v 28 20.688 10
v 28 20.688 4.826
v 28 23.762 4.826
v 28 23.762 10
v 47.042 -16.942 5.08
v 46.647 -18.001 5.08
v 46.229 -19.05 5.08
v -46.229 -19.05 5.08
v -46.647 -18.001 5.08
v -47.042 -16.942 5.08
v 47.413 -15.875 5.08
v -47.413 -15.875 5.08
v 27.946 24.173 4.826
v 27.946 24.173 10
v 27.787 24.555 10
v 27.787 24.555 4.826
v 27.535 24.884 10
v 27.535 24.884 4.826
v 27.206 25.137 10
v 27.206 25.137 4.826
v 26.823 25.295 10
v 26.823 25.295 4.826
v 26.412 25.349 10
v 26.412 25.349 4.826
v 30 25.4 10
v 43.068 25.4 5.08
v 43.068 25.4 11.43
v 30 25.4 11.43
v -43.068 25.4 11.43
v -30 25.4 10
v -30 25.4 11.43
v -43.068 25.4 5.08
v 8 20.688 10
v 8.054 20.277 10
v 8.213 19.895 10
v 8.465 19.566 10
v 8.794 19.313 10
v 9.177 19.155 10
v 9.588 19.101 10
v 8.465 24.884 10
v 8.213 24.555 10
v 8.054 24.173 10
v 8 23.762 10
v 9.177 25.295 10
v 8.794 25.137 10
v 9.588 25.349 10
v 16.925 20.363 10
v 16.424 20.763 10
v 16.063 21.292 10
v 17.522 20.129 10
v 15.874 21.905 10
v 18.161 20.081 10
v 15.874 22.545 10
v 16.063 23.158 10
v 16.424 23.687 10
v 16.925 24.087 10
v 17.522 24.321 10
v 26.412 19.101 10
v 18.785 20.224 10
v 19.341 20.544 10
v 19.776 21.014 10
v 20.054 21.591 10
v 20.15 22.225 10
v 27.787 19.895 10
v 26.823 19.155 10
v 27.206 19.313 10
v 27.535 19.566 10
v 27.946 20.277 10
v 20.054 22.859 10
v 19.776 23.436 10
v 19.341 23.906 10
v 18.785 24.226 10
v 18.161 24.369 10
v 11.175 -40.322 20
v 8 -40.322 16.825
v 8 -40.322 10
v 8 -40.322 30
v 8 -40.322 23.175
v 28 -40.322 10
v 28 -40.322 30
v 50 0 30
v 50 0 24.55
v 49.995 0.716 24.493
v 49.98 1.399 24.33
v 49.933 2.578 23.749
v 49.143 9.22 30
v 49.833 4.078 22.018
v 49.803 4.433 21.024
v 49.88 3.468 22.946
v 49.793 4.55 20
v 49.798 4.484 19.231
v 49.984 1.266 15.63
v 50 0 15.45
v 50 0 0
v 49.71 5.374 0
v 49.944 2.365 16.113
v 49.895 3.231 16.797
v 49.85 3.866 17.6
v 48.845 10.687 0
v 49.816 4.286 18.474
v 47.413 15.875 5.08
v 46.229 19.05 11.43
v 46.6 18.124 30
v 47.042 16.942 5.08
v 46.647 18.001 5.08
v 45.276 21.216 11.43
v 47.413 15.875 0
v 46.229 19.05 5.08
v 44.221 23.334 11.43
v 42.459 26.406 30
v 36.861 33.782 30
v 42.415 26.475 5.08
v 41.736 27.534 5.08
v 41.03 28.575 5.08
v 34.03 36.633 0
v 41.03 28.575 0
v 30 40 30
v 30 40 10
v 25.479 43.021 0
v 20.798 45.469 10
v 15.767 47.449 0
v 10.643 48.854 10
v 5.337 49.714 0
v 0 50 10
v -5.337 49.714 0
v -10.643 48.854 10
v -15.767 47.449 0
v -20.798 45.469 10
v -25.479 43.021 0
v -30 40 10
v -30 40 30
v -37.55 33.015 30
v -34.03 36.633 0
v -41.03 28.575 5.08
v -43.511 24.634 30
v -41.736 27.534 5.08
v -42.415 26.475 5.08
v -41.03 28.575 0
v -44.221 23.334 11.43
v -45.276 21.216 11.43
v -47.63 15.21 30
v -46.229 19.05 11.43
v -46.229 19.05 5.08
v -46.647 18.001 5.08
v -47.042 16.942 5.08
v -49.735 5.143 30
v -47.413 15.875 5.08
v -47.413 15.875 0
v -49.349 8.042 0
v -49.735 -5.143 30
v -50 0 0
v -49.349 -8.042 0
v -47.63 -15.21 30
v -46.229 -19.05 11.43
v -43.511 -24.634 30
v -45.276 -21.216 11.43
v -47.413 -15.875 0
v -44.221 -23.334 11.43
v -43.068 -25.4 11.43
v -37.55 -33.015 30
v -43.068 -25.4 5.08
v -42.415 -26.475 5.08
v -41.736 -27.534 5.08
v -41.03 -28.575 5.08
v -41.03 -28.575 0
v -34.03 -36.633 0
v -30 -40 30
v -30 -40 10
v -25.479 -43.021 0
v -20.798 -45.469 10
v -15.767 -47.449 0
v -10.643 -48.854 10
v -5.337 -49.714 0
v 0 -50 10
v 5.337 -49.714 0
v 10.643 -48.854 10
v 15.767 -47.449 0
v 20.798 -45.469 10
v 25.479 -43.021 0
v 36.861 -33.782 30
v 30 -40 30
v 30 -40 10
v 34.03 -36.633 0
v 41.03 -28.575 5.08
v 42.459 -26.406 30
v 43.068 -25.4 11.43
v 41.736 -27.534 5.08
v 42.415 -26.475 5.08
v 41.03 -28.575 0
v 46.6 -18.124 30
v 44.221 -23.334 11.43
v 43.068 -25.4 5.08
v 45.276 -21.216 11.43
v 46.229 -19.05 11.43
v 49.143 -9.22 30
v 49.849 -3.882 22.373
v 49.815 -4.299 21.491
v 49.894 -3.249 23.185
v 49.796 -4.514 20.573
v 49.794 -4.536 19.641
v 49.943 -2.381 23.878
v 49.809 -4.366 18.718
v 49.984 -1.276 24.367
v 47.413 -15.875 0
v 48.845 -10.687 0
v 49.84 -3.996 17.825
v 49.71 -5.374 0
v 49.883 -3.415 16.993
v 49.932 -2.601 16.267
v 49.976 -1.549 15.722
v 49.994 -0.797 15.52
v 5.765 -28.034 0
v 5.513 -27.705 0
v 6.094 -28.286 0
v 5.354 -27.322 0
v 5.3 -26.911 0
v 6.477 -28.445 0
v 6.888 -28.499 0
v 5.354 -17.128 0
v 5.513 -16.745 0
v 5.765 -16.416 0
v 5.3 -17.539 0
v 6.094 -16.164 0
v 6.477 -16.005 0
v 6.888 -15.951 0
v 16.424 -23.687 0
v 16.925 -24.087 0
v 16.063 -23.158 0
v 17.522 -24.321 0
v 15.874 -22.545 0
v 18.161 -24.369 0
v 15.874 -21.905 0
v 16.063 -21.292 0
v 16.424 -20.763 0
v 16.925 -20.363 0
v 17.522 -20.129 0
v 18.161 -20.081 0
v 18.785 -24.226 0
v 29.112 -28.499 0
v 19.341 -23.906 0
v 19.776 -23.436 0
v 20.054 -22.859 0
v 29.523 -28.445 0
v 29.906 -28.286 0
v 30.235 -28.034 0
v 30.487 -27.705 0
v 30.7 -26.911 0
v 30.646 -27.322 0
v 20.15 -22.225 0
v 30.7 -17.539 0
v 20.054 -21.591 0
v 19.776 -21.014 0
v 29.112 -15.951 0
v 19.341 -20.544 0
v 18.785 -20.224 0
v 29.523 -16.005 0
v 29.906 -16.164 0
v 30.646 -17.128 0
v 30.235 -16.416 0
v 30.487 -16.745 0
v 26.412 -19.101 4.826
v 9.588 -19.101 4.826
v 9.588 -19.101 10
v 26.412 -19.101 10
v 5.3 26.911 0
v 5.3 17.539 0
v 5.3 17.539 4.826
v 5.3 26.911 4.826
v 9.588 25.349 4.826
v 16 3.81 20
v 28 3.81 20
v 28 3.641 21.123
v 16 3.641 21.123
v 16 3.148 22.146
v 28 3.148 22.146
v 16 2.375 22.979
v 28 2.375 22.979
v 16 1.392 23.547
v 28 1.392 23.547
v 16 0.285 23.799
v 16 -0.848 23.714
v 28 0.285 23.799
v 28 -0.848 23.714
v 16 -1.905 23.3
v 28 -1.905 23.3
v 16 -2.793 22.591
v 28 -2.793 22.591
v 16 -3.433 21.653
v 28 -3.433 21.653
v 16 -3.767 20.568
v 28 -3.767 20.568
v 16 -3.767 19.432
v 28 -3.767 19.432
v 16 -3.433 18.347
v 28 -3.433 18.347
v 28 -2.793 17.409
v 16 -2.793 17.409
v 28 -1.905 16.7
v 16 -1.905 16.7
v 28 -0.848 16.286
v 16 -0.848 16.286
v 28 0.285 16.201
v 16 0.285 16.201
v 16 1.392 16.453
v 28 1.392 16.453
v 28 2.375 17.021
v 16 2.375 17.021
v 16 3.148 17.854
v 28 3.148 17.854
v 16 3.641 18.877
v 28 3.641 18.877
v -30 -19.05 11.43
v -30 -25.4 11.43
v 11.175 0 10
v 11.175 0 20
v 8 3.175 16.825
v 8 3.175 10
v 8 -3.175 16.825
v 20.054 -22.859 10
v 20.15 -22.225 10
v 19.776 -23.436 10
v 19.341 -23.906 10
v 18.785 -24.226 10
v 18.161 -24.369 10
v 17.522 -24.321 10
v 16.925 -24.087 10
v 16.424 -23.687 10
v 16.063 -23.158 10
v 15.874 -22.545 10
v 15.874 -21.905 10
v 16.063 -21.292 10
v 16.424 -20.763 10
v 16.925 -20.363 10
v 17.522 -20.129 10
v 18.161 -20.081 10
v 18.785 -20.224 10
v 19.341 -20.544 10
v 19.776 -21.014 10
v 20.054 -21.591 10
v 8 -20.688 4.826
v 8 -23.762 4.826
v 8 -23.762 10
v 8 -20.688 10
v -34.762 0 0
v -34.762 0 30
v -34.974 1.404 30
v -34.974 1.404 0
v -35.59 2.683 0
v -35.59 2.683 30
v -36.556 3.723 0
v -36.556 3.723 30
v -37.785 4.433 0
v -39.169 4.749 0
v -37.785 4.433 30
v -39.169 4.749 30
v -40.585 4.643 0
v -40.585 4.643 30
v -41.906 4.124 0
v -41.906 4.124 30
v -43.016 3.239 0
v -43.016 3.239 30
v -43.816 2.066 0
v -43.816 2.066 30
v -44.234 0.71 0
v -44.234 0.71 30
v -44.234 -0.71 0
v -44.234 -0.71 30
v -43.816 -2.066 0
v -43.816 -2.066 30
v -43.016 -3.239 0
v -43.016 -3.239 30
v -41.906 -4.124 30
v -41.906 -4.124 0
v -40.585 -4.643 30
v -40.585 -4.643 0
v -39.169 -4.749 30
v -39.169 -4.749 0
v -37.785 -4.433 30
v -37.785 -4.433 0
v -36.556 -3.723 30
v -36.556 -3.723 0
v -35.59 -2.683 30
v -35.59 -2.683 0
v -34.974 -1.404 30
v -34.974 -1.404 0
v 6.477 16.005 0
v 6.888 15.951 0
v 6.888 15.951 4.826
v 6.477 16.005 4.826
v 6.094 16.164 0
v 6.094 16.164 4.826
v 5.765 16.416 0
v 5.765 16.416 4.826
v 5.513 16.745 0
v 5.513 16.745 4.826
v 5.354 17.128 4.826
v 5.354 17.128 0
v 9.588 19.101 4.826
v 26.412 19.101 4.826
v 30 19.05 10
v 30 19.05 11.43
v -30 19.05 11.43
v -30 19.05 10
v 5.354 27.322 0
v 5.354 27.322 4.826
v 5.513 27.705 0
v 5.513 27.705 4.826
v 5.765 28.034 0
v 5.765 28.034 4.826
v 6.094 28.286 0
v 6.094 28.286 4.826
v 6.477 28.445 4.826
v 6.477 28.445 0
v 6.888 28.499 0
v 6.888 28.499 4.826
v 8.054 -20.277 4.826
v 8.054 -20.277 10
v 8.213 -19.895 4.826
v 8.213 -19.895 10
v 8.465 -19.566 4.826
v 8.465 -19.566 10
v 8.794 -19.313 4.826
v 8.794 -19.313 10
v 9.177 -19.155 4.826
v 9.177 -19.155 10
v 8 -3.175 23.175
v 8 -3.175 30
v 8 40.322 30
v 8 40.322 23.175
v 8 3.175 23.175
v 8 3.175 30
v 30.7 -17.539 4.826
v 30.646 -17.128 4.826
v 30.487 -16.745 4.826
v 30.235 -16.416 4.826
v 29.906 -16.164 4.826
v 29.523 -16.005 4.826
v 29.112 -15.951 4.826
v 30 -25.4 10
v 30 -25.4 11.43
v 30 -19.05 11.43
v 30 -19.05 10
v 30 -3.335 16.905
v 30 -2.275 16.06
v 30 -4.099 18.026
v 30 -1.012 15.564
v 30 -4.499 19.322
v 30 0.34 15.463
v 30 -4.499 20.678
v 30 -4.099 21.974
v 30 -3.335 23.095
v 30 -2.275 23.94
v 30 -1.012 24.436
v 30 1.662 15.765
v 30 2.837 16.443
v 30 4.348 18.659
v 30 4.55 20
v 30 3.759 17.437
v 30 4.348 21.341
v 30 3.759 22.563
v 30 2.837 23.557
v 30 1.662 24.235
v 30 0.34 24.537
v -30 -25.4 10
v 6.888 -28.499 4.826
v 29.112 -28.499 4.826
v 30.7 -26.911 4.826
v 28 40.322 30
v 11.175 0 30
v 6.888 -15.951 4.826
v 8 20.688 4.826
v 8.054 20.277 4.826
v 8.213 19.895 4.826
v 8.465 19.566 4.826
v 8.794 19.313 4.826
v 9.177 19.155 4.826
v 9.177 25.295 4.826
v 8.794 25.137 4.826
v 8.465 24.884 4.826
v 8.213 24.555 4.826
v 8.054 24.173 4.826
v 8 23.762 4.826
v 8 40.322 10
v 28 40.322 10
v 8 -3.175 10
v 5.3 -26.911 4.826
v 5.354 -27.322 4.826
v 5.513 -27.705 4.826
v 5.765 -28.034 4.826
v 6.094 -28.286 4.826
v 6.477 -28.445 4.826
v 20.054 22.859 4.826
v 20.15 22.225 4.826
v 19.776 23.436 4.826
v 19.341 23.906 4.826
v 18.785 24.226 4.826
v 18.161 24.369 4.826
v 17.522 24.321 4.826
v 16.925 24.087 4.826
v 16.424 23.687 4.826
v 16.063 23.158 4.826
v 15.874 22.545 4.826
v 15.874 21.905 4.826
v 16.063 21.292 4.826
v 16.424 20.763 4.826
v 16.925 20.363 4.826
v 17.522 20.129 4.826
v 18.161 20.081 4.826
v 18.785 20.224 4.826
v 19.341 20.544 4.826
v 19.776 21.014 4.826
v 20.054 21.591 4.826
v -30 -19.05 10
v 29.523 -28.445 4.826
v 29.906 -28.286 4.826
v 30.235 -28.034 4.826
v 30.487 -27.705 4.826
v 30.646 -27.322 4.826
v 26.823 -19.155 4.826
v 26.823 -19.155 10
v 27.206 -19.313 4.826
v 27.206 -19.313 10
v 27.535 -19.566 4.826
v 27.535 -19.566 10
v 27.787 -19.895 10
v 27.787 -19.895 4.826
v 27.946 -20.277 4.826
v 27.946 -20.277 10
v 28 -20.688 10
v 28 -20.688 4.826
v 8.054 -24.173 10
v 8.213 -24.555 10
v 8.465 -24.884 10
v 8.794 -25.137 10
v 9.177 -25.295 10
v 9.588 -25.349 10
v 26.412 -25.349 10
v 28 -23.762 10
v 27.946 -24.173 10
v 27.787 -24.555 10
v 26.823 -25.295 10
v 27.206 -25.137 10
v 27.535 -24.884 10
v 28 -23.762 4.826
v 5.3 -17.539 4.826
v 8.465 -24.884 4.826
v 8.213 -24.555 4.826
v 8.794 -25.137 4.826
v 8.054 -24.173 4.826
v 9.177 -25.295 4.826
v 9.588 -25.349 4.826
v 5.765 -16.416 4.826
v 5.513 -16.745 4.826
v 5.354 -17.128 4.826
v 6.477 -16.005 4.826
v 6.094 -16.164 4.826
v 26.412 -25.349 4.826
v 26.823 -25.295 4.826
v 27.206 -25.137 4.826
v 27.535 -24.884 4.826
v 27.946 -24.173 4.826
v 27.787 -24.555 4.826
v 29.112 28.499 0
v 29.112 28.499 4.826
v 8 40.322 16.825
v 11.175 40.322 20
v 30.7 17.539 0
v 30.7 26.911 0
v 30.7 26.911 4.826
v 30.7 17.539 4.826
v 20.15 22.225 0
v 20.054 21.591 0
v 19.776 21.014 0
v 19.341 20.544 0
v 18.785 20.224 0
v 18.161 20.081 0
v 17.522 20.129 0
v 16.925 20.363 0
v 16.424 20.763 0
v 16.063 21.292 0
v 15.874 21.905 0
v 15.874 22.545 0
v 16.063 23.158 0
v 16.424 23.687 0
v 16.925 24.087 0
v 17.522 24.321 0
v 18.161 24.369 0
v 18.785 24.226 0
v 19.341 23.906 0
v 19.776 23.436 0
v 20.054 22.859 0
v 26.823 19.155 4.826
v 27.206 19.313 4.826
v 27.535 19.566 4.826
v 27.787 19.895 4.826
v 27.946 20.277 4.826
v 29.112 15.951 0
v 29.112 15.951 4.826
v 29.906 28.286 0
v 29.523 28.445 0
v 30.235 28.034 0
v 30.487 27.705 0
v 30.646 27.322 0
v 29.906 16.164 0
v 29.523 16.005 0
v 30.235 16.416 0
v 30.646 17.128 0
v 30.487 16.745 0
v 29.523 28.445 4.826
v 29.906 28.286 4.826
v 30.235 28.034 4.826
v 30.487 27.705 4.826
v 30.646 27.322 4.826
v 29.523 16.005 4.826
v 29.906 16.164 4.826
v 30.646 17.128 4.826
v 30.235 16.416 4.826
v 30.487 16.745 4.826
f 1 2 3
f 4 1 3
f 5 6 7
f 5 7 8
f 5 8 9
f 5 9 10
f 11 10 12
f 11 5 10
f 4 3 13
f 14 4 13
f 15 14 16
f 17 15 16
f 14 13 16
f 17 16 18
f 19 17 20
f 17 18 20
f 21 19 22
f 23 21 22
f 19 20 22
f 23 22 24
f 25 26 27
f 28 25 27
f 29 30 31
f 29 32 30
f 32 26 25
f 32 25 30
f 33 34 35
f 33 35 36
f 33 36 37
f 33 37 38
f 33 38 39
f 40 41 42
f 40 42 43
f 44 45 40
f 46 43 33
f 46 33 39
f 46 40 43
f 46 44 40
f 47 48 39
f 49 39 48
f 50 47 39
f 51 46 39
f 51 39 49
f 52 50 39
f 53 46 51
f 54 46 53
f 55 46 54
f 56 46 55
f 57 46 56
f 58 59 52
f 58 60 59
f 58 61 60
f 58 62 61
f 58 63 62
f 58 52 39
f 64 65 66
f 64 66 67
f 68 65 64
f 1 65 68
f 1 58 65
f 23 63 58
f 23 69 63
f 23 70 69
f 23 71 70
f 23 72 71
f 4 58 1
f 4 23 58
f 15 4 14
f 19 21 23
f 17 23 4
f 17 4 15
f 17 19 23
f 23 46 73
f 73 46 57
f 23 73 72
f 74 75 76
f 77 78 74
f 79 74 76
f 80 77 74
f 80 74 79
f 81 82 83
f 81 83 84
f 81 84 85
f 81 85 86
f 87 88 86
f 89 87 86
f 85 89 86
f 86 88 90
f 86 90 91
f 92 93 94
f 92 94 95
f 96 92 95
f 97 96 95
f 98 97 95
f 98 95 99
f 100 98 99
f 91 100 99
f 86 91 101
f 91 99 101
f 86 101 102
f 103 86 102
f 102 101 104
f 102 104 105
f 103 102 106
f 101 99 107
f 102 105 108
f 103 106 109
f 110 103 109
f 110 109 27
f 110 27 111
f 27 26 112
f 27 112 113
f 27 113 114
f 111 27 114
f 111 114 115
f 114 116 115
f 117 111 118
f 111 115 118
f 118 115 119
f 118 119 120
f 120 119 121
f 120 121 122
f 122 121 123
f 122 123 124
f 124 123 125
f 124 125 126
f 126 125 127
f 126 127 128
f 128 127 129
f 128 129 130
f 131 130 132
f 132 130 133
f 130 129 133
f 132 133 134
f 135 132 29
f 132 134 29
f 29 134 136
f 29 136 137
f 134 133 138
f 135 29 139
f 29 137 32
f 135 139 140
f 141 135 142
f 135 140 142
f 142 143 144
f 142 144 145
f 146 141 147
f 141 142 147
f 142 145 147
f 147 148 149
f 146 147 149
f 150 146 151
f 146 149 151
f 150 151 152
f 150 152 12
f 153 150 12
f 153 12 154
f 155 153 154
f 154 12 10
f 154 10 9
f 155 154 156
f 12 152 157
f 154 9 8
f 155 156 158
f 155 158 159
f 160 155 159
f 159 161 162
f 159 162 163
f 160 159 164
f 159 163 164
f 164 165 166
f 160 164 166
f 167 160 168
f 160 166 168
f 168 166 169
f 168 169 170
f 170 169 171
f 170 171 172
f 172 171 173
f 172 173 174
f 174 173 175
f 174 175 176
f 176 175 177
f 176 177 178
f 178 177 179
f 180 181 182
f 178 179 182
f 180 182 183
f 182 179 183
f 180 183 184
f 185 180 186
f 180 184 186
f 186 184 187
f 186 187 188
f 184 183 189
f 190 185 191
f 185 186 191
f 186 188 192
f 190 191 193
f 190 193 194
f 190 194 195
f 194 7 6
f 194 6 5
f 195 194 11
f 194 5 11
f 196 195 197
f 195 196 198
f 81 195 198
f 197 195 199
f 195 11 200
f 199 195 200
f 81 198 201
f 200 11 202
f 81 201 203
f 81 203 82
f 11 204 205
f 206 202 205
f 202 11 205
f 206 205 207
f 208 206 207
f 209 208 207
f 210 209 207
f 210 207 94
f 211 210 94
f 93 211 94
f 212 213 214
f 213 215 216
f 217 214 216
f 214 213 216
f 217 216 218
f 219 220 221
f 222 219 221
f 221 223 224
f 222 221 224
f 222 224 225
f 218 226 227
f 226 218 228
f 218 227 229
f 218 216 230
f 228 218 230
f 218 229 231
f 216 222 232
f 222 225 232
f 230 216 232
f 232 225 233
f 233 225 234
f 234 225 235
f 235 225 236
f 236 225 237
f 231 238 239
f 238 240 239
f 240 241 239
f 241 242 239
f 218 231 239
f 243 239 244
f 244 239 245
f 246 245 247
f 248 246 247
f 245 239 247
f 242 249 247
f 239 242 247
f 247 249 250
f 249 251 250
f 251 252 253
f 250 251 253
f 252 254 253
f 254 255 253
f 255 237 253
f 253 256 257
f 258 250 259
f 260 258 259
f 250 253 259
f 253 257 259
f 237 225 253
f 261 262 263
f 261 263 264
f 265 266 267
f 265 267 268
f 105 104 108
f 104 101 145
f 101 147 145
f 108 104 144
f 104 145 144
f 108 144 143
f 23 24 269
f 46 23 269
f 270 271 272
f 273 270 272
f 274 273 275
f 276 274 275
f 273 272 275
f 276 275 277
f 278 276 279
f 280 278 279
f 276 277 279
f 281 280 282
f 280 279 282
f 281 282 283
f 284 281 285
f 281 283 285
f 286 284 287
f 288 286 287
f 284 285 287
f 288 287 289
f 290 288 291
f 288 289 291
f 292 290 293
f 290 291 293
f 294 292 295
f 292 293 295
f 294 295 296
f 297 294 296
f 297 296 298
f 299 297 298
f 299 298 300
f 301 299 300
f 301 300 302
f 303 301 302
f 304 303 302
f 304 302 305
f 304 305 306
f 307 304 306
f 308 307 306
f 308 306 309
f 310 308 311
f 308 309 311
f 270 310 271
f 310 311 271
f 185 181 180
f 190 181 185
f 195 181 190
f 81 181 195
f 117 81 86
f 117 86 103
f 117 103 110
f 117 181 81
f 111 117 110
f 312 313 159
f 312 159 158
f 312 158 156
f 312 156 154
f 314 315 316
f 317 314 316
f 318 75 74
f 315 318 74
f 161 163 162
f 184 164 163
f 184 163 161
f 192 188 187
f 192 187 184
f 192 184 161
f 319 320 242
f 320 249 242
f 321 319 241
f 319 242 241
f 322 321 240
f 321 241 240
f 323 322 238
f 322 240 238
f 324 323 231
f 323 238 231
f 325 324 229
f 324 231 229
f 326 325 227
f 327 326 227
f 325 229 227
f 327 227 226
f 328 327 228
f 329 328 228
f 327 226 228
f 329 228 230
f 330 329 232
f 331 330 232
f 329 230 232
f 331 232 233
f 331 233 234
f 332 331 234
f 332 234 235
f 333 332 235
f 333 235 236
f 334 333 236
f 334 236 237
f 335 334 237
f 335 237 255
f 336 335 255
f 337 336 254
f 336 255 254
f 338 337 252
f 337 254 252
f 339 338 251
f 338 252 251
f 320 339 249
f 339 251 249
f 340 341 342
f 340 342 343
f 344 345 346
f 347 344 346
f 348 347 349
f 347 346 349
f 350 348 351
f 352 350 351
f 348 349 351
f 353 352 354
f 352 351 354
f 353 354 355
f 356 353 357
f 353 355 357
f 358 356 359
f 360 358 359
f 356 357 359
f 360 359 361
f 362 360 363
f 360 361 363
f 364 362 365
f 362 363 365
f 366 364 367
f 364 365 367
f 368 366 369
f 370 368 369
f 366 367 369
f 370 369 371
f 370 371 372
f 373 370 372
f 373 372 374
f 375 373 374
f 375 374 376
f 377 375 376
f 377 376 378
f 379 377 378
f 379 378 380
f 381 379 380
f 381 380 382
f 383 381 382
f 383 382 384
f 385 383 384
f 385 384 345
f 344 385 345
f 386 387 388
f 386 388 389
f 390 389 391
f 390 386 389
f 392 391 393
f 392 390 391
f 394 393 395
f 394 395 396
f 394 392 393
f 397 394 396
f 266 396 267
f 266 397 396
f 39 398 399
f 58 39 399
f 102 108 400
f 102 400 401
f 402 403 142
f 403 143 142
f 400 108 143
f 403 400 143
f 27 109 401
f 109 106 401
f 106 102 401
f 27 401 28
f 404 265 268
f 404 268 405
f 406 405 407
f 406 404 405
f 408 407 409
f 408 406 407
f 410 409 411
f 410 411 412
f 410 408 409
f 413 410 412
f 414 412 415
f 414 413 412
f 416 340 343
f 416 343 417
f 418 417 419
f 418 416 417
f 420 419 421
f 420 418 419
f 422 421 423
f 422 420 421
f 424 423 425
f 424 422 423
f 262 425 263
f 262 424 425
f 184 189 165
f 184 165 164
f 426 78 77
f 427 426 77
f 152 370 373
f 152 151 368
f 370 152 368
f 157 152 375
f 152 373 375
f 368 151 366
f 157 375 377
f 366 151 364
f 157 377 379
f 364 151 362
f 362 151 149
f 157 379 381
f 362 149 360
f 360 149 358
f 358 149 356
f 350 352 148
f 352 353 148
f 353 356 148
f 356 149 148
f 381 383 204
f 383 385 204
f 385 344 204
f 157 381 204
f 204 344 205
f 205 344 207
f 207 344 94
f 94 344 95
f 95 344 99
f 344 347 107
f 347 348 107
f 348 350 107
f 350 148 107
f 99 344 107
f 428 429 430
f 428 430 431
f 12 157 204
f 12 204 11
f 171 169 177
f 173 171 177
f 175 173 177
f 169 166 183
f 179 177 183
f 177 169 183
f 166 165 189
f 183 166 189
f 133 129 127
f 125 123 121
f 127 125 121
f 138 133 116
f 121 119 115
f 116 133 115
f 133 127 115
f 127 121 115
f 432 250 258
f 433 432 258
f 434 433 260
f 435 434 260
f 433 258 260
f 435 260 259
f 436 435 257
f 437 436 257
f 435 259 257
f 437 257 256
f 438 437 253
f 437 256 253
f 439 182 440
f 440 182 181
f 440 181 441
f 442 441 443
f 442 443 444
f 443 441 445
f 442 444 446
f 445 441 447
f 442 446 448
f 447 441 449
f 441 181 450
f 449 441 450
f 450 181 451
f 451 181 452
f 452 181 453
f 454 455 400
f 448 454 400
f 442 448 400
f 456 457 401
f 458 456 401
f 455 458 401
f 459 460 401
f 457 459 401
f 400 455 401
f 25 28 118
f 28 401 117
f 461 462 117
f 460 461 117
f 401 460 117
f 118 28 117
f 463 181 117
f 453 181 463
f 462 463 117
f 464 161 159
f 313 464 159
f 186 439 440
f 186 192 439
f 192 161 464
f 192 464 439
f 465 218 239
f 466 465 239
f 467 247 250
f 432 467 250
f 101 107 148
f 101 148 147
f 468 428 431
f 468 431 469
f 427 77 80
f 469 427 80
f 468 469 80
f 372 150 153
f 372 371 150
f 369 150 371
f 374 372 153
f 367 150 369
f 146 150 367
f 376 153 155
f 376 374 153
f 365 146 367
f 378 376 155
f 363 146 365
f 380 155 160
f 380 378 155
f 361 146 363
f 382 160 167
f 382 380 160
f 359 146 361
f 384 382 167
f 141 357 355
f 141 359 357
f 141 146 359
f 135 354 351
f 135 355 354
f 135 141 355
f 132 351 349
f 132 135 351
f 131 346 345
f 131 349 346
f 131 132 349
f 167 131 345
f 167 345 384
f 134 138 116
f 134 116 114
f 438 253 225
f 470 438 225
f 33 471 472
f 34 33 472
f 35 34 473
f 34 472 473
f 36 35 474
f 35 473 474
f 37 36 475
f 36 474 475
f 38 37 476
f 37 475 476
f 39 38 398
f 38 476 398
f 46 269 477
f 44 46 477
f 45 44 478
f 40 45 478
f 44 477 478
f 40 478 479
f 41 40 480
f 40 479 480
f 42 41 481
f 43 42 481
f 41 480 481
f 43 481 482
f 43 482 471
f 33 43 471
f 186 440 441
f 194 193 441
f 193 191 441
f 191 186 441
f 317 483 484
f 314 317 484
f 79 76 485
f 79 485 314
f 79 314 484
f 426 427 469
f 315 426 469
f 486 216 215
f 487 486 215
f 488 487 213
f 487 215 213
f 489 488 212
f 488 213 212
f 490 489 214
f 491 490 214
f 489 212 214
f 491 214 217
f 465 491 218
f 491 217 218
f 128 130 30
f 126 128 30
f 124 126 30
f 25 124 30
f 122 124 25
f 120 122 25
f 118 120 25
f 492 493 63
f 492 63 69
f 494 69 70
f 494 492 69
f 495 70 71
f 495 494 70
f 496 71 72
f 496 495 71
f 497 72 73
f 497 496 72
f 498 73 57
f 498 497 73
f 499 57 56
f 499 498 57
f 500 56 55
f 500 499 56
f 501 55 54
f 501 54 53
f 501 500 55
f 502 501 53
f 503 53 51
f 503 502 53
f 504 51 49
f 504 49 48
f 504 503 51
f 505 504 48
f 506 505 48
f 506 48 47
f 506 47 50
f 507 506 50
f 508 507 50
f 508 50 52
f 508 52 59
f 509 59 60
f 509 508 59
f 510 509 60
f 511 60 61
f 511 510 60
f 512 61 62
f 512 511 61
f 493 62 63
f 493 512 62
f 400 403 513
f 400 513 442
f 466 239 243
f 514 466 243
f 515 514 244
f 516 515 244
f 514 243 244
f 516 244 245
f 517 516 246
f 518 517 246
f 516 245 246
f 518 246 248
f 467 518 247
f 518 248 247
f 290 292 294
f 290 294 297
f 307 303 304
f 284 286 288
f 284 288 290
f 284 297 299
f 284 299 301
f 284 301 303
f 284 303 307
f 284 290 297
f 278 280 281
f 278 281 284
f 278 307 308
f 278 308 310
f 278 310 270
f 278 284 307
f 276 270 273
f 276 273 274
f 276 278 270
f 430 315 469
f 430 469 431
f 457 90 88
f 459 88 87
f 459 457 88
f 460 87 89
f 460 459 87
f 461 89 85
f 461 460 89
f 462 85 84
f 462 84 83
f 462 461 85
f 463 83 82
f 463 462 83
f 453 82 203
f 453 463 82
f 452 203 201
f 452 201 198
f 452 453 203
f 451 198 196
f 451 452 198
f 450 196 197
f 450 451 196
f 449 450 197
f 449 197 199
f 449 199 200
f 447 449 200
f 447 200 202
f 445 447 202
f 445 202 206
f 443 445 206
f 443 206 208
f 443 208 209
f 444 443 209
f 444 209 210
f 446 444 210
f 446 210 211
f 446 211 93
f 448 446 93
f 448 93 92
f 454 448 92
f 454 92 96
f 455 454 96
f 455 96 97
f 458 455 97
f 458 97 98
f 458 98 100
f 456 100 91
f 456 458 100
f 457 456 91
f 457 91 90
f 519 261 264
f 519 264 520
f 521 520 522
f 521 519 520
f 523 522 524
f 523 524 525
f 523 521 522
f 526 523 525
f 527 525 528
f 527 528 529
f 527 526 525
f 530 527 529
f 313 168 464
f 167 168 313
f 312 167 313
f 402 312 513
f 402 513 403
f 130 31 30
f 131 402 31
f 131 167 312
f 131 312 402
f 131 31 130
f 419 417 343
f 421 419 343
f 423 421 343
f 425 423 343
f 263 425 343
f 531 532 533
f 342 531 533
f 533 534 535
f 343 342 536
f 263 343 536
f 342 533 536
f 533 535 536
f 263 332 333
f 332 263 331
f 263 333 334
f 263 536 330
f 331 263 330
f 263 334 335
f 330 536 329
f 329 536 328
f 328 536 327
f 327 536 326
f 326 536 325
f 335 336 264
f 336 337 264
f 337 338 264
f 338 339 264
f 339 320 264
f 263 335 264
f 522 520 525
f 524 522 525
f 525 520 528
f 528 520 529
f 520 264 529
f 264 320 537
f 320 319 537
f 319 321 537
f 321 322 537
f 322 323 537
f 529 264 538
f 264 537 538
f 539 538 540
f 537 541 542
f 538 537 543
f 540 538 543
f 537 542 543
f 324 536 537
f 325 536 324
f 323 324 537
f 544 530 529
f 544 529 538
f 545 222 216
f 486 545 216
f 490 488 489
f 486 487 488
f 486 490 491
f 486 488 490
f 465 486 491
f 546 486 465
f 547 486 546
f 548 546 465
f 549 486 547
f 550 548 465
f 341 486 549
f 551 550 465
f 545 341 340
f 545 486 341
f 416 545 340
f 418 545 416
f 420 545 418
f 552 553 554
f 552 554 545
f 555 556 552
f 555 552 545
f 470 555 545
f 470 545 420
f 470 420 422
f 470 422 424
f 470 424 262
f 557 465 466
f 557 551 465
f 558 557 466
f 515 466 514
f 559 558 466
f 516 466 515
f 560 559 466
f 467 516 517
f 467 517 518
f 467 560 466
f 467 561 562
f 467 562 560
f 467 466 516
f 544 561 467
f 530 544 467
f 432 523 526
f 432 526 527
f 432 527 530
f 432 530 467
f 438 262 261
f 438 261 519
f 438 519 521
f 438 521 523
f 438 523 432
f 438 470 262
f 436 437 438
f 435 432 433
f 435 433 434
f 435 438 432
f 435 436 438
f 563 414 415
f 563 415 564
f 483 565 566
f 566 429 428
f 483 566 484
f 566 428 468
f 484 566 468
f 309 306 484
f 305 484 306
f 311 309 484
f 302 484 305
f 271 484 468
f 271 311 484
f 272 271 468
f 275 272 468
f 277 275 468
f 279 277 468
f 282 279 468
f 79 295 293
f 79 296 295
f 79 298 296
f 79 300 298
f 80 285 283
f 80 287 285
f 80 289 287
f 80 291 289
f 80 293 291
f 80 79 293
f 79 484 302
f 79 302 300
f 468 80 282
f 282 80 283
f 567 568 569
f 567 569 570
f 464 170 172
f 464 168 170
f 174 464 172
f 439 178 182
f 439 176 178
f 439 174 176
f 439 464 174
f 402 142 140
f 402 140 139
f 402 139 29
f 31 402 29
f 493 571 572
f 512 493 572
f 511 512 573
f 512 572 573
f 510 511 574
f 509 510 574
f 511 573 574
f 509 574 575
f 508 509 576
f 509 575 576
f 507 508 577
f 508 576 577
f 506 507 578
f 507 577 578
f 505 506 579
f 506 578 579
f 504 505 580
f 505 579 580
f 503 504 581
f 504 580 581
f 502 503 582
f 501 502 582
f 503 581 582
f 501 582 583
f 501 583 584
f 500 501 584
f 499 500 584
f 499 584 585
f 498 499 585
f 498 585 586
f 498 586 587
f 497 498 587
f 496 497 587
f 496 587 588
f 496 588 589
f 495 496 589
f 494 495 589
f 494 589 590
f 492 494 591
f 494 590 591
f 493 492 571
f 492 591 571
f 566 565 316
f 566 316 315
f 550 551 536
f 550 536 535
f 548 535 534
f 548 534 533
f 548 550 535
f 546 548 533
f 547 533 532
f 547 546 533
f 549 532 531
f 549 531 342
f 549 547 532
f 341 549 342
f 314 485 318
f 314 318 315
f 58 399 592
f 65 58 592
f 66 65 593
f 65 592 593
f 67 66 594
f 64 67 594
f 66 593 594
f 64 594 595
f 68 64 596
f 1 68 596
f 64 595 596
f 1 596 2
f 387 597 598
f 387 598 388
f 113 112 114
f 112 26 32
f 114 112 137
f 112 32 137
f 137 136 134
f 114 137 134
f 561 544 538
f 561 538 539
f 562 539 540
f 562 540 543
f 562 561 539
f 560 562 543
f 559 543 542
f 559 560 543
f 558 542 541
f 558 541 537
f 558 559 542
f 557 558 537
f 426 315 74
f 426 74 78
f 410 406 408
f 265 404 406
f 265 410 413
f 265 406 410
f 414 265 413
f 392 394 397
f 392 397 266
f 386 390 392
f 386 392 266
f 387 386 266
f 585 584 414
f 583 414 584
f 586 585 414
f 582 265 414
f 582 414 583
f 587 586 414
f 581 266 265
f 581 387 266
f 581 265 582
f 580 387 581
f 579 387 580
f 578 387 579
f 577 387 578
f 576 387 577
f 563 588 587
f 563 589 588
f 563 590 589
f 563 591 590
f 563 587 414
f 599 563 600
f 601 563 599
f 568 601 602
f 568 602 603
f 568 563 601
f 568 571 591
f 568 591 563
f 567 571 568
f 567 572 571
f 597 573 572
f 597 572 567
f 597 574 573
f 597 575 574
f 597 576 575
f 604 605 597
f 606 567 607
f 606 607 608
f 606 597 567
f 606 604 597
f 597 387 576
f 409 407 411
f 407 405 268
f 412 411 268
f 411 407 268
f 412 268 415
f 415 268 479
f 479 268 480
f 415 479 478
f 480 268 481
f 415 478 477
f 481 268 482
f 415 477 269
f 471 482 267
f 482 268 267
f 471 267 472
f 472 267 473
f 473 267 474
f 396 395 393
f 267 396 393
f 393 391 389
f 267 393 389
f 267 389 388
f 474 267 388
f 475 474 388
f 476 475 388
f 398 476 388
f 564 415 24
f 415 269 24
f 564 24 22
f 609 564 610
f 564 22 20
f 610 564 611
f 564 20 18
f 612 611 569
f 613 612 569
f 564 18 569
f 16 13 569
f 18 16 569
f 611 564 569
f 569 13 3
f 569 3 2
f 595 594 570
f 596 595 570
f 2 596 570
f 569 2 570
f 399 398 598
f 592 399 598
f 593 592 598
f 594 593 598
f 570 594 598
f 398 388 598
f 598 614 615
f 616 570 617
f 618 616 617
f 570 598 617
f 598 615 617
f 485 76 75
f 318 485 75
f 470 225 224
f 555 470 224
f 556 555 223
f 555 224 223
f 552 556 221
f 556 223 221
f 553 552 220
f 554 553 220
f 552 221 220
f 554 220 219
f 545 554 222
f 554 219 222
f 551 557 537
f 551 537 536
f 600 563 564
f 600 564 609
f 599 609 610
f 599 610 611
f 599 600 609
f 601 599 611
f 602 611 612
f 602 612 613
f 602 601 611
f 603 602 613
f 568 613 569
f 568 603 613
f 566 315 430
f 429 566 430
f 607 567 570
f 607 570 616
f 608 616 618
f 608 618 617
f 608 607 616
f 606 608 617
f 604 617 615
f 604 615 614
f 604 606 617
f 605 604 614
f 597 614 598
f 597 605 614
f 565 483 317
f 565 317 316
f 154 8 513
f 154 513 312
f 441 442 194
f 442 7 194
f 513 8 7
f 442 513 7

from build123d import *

# Parameters (mm, degrees)
F0_R          = 50
F1_DEPTH      = 30
F2_W          = 60
F2_H          = 104.775
F3_DEPTH      = 20
F4_W          = 12.7
F4_H          = 5.08
F5_DEPTH      = 50.001
F5_DEPTH_BACK = 50.001
F6_W          = 6.35
F6_H          = 12.7
F7_DEPTH      = 50.001
F7_DEPTH_BACK = 50.001
F8_R          = 4.55
F9_DEPTH      = 50.001
F10_R         = 2.15
F11_DEPTH     = 4.826
F12_R         = 2.15
F13_DEPTH     = 5.174
F15_W         = 20
F15_H         = 20
F16_DEPTH     = 40.3225
F17_R         = 3.81
F18_DEPTH     = 12
F20_DEPTH     = 90.3235001
F22_DEPTH     = 30.0010001
F23_R         = 4.7625
F24_DEPTH     = 30.0010001


with BuildPart() as f1:
    # F0 (on Top) → F1 (new body)
    with BuildSketch(Plane.XY):
        Circle(F0_R)
    extrude(amount=F1_DEPTH)

    # F2 (on face) → F3 (cut)
    with BuildSketch(Plane.XY.offset(30)):
        Rectangle(F2_W, F2_H)
    extrude(amount=-F3_DEPTH, mode=Mode.SUBTRACT)

    # F4 (on Right) → F5 (cut, two sides)
    with BuildSketch(Plane.YZ) as f5_sk:
        with Locations((-22.225, 2.54)):
            Rectangle(F4_W, F4_H)
        with Locations((22.225, 2.54)):
            Rectangle(F4_W, F4_H)
    extrude(amount=-F5_DEPTH, mode=Mode.SUBTRACT)
    extrude(f5_sk.sketch, amount=F5_DEPTH_BACK, mode=Mode.SUBTRACT)

    # F6 (on Right) → F7 (cut, two sides)
    with BuildSketch(Plane.YZ) as f7_sk:
        with Locations((-22.225, 5.08)):
            Rectangle(F6_W, F6_H)
        with Locations((22.225, 5.08)):
            Rectangle(F6_W, F6_H)
    extrude(amount=-F7_DEPTH, mode=Mode.SUBTRACT)
    extrude(f7_sk.sketch, amount=F7_DEPTH_BACK, mode=Mode.SUBTRACT)

    # F8 (on Right) → F9 (cut, through all)
    with BuildSketch(Plane.YZ):
        with Locations((0, 20)):
            Circle(F8_R)
    extrude(amount=F9_DEPTH, mode=Mode.SUBTRACT)

    # F23 (on face) → F24 (cut, through all)
    with BuildSketch(Plane.XY.offset(30)):
        with Locations((-39.525, 0)):
            Circle(F23_R)
    extrude(amount=-F24_DEPTH, mode=Mode.SUBTRACT)


with BuildPart() as f11:
    # F10 (on face) → F11 (new body)
    with BuildSketch(Plane(origin=(0, 0, 0), x_dir=(1, 0, 0), z_dir=(0, 0, -1))):
        with BuildLine():
            Line((6.8875, -28.4988), (29.1125, -28.4988))
            ThreePointArc((29.1125, -28.4988), (30.2350320151, -28.0338320151), (30.7, -26.9113))
            Line((30.7, -26.9113), (30.7, -17.5387))
            ThreePointArc((30.7, -17.5387), (30.2350320151, -16.4161679849), (29.1125, -15.9512))
            Line((29.1125, -15.9512), (6.8875, -15.9512))
            ThreePointArc((6.8875, -15.9512), (5.7649679849, -16.4161679849), (5.3, -17.5387))
            Line((5.3, -17.5387), (5.3, -26.9113))
            ThreePointArc((5.3, -26.9113), (5.7649679849, -28.0338320151), (6.8875, -28.4988))
        make_face()
        with Locations((18, -22.225)):
            Circle(F10_R, mode=Mode.SUBTRACT)
    extrude(amount=-F11_DEPTH)

    # F12 (on face) → F13 (join, through all)
    with BuildSketch(Plane.XY.offset(4.826)):
        with BuildLine():
            ThreePointArc((8, 20.6883), (8.4649679849, 19.5657679849), (9.5875, 19.1008))
            Line((9.5875, 19.1008), (26.4125, 19.1008))
            ThreePointArc((26.4125, 19.1008), (27.5350320151, 19.5657679849), (28, 20.6883))
            Line((28, 20.6883), (28, 23.7617))
            ThreePointArc((28, 23.7617), (27.5350320151, 24.8842320151), (26.4125, 25.3492))
            Line((26.4125, 25.3492), (9.5875, 25.3492))
            ThreePointArc((9.5875, 25.3492), (8.4649679849, 24.8842320151), (8, 23.7617))
            Line((8, 23.7617), (8, 20.6883))
        make_face()
        with Locations((18, 22.225)):
            Circle(F12_R, mode=Mode.SUBTRACT)
    extrude(amount=F13_DEPTH)


with BuildPart() as f14_1:
    # F14: instance of F11
    add(f11.part.mirror(Plane.XZ))


with BuildPart() as f16:
    # F15 (on Front) → F16 (new body, symmetric)
    with BuildSketch(Plane.XZ):
        with Locations((18, 20)):
            Rectangle(F15_W, F15_H)
    extrude(amount=F16_DEPTH, both=True)

    # F17 (on face) → F18 (cut)
    with BuildSketch(Plane.YZ.offset(28)):
        with Locations((0, 20)):
            Circle(F17_R)
    extrude(amount=-F18_DEPTH, mode=Mode.SUBTRACT)

    # F19 (on face) → F20 (cut, through all)
    with BuildSketch(Plane.XZ.offset(40.3225)):
        Polygon((8, 23.175), (8, 16.825), (11.175, 20), align=None)
    extrude(amount=-F20_DEPTH, mode=Mode.SUBTRACT)

    # F21 (on face) → F22 (cut, through all)
    with BuildSketch(Plane.XY.offset(30)):
        Polygon((11.175, 0), (8, 3.175), (8, -3.175), align=None)
    extrude(amount=-F22_DEPTH, mode=Mode.SUBTRACT)


solid = Compound([f1.part, f11.part, f14_1.part, f16.part])
